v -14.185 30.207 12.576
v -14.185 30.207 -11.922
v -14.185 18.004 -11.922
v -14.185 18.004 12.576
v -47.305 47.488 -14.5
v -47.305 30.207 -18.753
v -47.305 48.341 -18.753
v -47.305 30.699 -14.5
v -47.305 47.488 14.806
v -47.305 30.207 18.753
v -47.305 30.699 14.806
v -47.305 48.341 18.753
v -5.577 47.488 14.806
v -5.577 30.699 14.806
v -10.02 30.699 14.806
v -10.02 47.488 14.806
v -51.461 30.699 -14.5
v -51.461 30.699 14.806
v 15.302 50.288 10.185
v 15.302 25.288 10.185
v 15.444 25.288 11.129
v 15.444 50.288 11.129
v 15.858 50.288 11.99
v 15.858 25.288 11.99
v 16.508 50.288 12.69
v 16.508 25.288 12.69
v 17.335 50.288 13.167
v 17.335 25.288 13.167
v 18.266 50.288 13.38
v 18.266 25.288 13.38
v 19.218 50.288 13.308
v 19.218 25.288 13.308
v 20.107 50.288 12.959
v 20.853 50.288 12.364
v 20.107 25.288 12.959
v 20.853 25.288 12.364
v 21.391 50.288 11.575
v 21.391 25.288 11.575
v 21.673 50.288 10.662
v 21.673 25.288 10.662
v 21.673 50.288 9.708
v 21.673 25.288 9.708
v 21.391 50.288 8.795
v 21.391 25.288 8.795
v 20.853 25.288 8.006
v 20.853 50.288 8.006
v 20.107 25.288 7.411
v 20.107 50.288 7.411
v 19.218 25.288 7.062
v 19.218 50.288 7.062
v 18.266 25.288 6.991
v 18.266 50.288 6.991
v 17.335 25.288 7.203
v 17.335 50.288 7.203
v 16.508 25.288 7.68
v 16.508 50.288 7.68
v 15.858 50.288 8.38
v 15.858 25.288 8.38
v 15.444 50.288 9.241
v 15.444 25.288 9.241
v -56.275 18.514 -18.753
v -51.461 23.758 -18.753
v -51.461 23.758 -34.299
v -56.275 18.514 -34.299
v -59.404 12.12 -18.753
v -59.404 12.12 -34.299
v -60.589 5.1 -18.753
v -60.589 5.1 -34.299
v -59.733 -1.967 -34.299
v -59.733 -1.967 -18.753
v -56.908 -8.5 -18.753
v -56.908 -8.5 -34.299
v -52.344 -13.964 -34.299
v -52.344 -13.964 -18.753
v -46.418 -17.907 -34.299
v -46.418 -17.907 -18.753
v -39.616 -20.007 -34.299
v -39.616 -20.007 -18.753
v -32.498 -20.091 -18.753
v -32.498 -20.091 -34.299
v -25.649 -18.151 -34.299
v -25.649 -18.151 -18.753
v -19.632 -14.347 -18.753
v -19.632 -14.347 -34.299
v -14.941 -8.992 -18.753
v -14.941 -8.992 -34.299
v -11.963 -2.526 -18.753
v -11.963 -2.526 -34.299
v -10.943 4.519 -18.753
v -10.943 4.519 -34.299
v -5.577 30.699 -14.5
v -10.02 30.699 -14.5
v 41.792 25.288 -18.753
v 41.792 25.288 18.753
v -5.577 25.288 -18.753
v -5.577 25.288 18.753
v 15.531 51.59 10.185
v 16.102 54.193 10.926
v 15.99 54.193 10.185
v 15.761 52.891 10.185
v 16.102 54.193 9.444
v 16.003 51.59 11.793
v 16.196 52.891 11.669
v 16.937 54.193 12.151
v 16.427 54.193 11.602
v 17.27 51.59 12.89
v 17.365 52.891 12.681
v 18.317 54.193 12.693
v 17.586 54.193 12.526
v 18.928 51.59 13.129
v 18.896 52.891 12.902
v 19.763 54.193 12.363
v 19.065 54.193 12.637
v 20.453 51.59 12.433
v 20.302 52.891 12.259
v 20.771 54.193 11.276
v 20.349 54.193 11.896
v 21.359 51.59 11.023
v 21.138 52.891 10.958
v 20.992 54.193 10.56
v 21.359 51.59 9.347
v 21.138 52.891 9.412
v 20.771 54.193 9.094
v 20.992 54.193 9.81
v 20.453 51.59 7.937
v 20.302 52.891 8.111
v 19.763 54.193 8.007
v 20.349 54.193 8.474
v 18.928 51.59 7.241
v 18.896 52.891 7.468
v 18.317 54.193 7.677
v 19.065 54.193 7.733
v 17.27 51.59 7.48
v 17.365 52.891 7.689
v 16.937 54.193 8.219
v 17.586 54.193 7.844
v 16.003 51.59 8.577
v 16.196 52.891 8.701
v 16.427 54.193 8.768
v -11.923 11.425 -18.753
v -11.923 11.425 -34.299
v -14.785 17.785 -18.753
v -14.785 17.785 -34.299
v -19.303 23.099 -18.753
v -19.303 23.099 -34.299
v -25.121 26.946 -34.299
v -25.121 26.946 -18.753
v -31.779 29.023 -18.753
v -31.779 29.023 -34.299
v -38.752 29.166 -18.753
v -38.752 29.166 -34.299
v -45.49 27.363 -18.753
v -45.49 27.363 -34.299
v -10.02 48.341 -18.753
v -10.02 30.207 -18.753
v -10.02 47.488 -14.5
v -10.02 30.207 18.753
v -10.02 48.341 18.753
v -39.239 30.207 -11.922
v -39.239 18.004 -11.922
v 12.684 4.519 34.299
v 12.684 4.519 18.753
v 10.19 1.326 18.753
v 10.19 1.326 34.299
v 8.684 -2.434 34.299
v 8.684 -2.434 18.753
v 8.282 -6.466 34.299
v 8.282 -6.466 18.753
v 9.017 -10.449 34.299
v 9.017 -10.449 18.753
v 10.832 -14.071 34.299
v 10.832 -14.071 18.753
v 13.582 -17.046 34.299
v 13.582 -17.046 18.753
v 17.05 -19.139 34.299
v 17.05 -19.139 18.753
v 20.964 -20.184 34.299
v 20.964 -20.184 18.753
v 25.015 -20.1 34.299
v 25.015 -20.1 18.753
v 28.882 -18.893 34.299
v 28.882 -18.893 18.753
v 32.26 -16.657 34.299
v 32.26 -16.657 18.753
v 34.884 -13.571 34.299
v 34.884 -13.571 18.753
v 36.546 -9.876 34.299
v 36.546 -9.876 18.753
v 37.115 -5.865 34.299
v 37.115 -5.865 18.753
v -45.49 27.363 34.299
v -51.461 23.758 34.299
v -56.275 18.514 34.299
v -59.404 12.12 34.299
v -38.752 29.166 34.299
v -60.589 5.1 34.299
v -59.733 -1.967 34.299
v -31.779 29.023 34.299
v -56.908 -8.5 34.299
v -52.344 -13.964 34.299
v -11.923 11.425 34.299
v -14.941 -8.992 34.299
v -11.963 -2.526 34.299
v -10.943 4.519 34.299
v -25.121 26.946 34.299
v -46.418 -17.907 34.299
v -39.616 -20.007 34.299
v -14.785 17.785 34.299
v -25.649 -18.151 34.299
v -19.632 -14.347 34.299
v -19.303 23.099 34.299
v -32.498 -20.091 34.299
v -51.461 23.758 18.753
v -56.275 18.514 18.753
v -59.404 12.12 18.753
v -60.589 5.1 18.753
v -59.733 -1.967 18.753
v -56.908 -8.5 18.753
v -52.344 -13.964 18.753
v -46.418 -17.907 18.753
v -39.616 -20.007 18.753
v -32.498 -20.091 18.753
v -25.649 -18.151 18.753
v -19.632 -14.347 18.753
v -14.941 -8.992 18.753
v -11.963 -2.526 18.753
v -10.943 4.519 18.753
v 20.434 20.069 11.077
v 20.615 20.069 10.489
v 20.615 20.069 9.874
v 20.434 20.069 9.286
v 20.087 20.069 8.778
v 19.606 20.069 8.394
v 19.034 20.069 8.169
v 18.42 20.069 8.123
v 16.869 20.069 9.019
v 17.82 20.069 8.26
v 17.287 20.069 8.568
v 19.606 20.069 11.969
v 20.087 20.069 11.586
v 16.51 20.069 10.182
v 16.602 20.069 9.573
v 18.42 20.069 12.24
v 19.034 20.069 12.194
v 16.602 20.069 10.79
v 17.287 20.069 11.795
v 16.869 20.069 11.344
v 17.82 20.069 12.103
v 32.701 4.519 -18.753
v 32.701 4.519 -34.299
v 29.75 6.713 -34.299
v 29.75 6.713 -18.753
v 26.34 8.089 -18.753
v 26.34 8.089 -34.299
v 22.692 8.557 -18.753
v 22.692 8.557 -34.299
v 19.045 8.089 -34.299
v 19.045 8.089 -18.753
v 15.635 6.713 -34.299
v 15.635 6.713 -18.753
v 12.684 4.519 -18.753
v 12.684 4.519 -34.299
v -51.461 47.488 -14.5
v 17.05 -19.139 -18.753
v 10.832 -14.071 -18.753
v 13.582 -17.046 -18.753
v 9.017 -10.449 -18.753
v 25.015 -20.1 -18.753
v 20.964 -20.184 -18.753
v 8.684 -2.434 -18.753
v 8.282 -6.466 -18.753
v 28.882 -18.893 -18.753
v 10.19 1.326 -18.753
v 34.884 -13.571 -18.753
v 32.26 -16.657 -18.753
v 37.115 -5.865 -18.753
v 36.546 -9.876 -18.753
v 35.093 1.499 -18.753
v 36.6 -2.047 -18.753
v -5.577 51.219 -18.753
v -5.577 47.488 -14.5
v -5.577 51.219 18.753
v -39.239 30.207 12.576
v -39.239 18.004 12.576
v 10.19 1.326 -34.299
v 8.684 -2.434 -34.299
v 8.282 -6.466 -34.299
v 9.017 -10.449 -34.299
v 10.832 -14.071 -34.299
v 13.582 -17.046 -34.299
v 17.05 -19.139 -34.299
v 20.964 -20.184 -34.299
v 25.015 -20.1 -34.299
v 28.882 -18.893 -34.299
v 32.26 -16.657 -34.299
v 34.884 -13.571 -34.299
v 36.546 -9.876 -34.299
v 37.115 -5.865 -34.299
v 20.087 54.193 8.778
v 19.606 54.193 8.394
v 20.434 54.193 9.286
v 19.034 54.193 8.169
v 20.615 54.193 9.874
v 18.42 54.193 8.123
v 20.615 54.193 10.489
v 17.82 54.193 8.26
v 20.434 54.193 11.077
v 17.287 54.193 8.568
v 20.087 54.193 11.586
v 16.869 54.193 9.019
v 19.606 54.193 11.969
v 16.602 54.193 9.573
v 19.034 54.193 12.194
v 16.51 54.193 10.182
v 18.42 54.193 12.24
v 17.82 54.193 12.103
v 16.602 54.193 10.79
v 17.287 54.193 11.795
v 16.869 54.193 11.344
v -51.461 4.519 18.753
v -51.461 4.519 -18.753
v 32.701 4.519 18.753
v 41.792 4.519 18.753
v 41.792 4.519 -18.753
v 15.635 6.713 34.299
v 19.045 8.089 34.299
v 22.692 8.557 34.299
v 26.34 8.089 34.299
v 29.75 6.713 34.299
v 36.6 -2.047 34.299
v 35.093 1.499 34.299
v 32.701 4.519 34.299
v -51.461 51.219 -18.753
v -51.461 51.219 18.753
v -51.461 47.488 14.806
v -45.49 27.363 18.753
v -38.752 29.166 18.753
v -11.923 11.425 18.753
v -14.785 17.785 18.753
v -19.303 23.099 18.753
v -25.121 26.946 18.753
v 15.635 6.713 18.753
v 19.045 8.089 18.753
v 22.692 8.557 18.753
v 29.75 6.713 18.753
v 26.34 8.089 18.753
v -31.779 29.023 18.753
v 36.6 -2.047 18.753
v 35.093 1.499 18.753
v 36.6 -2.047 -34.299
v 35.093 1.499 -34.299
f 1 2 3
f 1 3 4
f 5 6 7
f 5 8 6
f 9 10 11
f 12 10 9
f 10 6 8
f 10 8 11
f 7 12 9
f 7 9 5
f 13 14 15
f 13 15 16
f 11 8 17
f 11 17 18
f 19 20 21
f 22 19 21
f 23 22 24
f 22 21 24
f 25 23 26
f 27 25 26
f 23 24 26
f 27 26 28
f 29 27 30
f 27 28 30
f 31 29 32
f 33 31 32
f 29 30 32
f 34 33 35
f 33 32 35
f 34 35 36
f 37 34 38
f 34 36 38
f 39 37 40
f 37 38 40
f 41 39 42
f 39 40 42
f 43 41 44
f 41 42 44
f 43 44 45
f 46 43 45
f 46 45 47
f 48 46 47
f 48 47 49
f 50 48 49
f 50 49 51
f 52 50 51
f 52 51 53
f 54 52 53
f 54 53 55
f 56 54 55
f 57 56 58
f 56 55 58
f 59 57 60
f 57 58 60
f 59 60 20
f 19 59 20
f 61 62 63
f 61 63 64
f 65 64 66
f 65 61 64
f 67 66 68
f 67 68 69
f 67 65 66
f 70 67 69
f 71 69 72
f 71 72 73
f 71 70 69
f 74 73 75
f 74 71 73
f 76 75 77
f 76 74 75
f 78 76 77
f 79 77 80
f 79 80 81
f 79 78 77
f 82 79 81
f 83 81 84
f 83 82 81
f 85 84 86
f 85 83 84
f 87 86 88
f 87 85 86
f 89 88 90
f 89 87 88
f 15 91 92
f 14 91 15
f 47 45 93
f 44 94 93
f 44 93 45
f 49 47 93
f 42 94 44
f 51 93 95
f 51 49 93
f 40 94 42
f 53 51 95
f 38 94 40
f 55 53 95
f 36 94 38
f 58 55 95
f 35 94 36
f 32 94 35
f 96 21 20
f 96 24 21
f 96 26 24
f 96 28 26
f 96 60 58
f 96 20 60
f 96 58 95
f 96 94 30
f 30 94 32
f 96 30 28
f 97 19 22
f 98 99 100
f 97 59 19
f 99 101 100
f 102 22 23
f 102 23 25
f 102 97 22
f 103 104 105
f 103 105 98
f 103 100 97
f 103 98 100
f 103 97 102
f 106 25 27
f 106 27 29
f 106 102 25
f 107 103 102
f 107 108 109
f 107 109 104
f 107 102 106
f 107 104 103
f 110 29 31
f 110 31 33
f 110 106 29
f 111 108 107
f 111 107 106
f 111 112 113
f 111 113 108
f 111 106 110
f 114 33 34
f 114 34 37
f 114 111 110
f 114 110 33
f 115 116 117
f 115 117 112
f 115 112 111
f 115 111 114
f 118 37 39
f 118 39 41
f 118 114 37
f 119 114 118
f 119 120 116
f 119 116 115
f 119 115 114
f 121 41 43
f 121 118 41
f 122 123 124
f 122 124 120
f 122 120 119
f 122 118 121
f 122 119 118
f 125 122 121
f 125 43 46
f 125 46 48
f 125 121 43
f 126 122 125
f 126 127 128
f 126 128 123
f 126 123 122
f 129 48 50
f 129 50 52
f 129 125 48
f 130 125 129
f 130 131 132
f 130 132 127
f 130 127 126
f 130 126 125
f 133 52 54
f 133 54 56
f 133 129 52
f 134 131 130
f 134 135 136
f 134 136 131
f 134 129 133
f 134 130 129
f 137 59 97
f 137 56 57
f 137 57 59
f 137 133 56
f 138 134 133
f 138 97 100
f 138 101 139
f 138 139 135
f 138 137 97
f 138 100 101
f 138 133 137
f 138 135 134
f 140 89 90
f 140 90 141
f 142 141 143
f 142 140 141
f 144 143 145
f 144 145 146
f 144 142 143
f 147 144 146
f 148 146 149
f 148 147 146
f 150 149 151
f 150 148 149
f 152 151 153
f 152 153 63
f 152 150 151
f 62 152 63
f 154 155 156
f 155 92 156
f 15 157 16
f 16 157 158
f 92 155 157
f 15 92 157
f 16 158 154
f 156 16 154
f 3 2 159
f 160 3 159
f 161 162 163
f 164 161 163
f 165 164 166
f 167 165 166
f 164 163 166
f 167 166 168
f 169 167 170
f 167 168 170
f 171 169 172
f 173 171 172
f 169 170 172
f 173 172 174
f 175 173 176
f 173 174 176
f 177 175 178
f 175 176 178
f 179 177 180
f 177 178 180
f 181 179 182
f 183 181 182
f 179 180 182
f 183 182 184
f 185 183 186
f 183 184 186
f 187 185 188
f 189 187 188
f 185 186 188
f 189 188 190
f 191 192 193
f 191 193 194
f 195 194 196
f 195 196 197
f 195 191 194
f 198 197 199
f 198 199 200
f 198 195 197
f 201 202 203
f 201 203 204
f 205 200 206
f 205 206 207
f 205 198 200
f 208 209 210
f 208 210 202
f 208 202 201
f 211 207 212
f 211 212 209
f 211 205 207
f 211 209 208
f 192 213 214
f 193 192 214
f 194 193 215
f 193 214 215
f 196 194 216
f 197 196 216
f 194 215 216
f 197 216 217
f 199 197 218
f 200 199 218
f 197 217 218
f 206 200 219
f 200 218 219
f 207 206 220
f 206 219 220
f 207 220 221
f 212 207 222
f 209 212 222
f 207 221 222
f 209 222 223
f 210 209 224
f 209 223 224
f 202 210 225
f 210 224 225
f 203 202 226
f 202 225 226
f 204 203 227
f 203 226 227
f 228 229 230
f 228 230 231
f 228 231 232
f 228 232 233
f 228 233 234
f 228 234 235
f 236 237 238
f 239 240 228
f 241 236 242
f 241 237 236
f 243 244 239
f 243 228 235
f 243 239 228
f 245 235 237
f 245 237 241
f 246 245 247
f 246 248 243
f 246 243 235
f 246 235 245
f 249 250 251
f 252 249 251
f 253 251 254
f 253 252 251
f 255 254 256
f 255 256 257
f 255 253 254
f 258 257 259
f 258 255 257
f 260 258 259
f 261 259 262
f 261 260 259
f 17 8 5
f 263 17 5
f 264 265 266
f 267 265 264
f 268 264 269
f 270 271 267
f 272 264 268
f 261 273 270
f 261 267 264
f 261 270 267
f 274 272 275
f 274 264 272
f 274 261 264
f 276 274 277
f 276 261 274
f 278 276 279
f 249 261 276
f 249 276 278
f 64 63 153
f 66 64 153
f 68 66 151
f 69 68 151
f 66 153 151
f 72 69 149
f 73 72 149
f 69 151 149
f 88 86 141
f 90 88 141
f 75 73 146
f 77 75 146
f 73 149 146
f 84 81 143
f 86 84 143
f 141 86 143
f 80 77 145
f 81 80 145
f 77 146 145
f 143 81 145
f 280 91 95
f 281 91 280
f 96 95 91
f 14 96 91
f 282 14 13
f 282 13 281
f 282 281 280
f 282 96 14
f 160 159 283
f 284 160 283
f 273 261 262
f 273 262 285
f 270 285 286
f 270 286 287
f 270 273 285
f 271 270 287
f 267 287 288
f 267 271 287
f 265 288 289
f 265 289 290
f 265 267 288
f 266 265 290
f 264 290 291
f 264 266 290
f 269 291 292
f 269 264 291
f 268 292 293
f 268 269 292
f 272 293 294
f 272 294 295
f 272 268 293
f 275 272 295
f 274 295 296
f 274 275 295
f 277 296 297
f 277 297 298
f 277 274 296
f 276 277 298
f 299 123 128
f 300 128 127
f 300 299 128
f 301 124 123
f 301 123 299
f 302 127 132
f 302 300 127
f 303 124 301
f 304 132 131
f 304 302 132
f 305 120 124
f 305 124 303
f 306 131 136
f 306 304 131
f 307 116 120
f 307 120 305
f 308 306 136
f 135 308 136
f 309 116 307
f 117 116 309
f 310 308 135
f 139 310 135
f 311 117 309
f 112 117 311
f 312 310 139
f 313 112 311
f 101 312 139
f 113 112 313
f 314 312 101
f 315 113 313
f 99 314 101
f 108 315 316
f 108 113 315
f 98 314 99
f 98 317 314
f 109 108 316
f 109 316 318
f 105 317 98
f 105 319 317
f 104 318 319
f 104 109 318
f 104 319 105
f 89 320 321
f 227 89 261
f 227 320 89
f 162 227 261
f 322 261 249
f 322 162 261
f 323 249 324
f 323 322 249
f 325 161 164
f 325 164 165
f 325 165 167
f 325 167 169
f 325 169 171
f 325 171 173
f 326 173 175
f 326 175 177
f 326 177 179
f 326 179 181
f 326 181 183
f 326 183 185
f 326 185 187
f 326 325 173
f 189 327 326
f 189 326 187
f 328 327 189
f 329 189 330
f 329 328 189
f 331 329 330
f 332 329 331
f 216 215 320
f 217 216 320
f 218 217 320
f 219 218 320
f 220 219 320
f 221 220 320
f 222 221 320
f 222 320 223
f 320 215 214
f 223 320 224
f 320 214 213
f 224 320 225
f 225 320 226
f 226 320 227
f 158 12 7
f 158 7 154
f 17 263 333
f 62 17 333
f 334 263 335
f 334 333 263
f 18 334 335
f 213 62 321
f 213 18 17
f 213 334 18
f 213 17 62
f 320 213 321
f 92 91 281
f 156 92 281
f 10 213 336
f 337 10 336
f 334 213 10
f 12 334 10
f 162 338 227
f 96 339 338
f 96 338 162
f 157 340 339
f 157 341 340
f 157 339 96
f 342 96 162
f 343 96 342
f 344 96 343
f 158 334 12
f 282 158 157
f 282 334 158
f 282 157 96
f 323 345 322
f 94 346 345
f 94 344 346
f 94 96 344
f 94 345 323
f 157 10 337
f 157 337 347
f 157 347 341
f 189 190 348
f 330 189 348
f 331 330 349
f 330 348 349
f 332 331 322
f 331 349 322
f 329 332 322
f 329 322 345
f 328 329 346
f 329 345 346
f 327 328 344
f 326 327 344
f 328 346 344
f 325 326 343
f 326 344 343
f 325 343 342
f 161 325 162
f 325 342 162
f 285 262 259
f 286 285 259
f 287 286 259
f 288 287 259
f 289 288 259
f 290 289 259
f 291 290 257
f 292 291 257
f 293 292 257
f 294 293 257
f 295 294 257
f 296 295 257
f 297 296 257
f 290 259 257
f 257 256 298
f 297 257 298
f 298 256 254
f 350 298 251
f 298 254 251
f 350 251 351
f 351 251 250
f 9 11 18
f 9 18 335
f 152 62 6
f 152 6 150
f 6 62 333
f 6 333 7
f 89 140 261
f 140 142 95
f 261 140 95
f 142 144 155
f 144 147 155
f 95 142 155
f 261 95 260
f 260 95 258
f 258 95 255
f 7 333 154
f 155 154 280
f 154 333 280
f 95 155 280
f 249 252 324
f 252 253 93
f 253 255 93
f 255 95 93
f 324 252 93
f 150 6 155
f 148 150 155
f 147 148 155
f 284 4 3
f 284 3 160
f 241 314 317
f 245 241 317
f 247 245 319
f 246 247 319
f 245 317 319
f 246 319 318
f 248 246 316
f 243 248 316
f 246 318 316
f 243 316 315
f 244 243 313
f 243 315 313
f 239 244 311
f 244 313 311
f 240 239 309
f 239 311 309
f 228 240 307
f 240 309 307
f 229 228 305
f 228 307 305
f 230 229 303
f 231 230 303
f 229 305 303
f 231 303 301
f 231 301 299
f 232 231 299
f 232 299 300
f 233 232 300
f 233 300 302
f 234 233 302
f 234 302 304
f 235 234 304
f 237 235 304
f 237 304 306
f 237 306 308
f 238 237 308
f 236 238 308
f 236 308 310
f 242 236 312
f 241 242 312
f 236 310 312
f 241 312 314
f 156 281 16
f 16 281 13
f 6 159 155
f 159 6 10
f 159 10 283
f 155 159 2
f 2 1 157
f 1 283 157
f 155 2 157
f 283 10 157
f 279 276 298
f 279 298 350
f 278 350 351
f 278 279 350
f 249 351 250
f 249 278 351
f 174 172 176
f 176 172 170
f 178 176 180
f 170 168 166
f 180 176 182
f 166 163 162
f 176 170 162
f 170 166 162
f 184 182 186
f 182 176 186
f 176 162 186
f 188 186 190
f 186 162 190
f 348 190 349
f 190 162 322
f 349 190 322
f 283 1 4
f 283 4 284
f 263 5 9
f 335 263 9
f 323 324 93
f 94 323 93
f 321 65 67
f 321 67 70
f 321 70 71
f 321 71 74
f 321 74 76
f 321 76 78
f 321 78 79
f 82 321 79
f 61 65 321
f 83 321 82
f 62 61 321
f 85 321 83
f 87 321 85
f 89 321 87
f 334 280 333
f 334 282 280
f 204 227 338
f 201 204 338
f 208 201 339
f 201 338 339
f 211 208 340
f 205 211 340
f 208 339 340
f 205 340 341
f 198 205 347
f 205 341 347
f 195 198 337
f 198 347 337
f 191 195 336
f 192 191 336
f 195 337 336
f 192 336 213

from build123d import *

# Parameters (mm, degrees)
F1_DEPTH  = 18.753305
F3_DEPTH  = 15.54585
F5_W      = 37.2849525884
F5_H      = 18.1331187487
F6_DEPTH  = 53.05346
F7_W      = 16.7898200452
F7_H      = 29.3058659881
F8_DEPTH  = 55.0196293017
F9_R      = 3.2034431946
F10_DEPTH = 25
F11_R     = 3.2034431946
F13_DEPTH = 3.90451
F13_TAPER = 10
F14_W     = 25.0537479296
F14_H     = 24.4980249554
F18_DEPTH = 12.2033338994
F16_R     = 2.0640703288
F17_DEPTH = 34.12419


with BuildPart() as f1:
    # F0 (on Top) → F1 (new body, symmetric)
    with BuildSketch(Plane.XY):
        Polygon((-5.5769230239, 51.2194294688), (-51.4608863181, 51.2194294688), (-51.4608863181, 4.5192311518), (-5.5769230239, 4.5192311518), (41.7920313589, 4.5192311518), (41.7920313589, 25.2884626389), (-5.5769230239, 25.2884626389), align=None)
    extrude(amount=F1_DEPTH, both=True)

    # F2 (on face) → F3 (join)
    with BuildSketch(Plane.XY.offset(18.753305)):
        with BuildLine():
            ThreePointArc((-51.4608863181, 23.7576867202), (-46.417709158, -17.9074521958), (-10.9429109093, 4.5192311518))
            Line((-10.9429109093, 4.5192311518), (-51.4608863181, 4.5192311518))
            Line((-51.4608863181, 4.5192311518), (-51.4608863181, 23.7576867202))
        make_face()
        with BuildLine():
            Line((-51.4608863181, 4.5192311518), (-10.9429109093, 4.5192311518))
            ThreePointArc((-10.9429109093, 4.5192311518), (-25.1207540769, 26.9459144993), (-51.4608863181, 23.7576867202))
            Line((-51.4608863181, 23.7576867202), (-51.4608863181, 4.5192311518))
        make_face()
        with BuildLine():
            ThreePointArc((32.7010839123, 4.5192311518), (22.6923078299, 8.5573695546), (12.6835317475, 4.5192311518))
            Line((12.6835317475, 4.5192311518), (32.7010839123, 4.5192311518))
        make_face()
        with BuildLine():
            Line((32.7010839123, 4.5192311518), (12.6835317475, 4.5192311518))
            ThreePointArc((12.6835317475, 4.5192311518), (17.0504227911, -19.1388547133), (37.1150626747, -5.8653852902))
            ThreePointArc((37.1150626747, -5.8653852902), (35.9657772529, -0.2235002514), (32.7010839123, 4.5192311518))
        make_face()
    extrude(amount=F3_DEPTH)

    # F4: F1 across plane


with BuildPart() as f1_1:
    add(f1.part)
    add(f1.part.mirror(Plane.XY))

    # F5 (on face) → F6 (cut, through all)
    with BuildSketch(Plane.XY.offset(18.753305)):
        with Locations((-28.6624371074, 39.2740033567)):
            Rectangle(F5_W, F5_H)
    extrude(amount=-F6_DEPTH, mode=Mode.SUBTRACT)

    # F7 (on face) → F8 (cut, through all)
    with BuildSketch(Plane.YZ.offset(-5.5769230239)):
        with Locations((39.0934366733, 0.1526279375)):
            Rectangle(F7_W, F7_H)
    extrude(amount=-F8_DEPTH, mode=Mode.SUBTRACT)

    # F9 (on face) → F10 (join)
    with BuildSketch(Plane(origin=(0, 25.2884626389, 0), x_dir=(-1, 0, 0), z_dir=(0, 1, 0))):
        with Locations((-18.5051690787, 10.1850191131)):
            Circle(F9_R)
    extrude(amount=F10_DEPTH)

    # F11 (on face) → F13 (join)
    with BuildSketch(Plane(origin=(0, 50.2884626389, 0), x_dir=(-1, 0, 0), z_dir=(0, 1, 0))):
        with Locations((-18.5051690787, 10.1850191131)):
            Circle(F11_R)
    extrude(amount=F13_DEPTH, taper=F13_TAPER)

    # F14 (on face) → F18 (cut)
    with BuildSketch(Plane(origin=(0, 30.2074439824, 0), x_dir=(-1, 0, 0), z_dir=(0, 1, 0))):
        with Locations((26.7121638171, 0.3265431151)):
            Rectangle(F14_W, F14_H)
    extrude(amount=-F18_DEPTH, mode=Mode.SUBTRACT)

    # F16 (on face) → F17 (cut)
    with BuildSketch(Plane(origin=(0, 54.1929726389, 0), x_dir=(-1, 0, 0), z_dir=(0, 1, 0))):
        with Locations((-18.574340269, 10.1817082614)):
            Circle(F16_R)
    extrude(amount=-F17_DEPTH, mode=Mode.SUBTRACT)


solid = f1_1.part
